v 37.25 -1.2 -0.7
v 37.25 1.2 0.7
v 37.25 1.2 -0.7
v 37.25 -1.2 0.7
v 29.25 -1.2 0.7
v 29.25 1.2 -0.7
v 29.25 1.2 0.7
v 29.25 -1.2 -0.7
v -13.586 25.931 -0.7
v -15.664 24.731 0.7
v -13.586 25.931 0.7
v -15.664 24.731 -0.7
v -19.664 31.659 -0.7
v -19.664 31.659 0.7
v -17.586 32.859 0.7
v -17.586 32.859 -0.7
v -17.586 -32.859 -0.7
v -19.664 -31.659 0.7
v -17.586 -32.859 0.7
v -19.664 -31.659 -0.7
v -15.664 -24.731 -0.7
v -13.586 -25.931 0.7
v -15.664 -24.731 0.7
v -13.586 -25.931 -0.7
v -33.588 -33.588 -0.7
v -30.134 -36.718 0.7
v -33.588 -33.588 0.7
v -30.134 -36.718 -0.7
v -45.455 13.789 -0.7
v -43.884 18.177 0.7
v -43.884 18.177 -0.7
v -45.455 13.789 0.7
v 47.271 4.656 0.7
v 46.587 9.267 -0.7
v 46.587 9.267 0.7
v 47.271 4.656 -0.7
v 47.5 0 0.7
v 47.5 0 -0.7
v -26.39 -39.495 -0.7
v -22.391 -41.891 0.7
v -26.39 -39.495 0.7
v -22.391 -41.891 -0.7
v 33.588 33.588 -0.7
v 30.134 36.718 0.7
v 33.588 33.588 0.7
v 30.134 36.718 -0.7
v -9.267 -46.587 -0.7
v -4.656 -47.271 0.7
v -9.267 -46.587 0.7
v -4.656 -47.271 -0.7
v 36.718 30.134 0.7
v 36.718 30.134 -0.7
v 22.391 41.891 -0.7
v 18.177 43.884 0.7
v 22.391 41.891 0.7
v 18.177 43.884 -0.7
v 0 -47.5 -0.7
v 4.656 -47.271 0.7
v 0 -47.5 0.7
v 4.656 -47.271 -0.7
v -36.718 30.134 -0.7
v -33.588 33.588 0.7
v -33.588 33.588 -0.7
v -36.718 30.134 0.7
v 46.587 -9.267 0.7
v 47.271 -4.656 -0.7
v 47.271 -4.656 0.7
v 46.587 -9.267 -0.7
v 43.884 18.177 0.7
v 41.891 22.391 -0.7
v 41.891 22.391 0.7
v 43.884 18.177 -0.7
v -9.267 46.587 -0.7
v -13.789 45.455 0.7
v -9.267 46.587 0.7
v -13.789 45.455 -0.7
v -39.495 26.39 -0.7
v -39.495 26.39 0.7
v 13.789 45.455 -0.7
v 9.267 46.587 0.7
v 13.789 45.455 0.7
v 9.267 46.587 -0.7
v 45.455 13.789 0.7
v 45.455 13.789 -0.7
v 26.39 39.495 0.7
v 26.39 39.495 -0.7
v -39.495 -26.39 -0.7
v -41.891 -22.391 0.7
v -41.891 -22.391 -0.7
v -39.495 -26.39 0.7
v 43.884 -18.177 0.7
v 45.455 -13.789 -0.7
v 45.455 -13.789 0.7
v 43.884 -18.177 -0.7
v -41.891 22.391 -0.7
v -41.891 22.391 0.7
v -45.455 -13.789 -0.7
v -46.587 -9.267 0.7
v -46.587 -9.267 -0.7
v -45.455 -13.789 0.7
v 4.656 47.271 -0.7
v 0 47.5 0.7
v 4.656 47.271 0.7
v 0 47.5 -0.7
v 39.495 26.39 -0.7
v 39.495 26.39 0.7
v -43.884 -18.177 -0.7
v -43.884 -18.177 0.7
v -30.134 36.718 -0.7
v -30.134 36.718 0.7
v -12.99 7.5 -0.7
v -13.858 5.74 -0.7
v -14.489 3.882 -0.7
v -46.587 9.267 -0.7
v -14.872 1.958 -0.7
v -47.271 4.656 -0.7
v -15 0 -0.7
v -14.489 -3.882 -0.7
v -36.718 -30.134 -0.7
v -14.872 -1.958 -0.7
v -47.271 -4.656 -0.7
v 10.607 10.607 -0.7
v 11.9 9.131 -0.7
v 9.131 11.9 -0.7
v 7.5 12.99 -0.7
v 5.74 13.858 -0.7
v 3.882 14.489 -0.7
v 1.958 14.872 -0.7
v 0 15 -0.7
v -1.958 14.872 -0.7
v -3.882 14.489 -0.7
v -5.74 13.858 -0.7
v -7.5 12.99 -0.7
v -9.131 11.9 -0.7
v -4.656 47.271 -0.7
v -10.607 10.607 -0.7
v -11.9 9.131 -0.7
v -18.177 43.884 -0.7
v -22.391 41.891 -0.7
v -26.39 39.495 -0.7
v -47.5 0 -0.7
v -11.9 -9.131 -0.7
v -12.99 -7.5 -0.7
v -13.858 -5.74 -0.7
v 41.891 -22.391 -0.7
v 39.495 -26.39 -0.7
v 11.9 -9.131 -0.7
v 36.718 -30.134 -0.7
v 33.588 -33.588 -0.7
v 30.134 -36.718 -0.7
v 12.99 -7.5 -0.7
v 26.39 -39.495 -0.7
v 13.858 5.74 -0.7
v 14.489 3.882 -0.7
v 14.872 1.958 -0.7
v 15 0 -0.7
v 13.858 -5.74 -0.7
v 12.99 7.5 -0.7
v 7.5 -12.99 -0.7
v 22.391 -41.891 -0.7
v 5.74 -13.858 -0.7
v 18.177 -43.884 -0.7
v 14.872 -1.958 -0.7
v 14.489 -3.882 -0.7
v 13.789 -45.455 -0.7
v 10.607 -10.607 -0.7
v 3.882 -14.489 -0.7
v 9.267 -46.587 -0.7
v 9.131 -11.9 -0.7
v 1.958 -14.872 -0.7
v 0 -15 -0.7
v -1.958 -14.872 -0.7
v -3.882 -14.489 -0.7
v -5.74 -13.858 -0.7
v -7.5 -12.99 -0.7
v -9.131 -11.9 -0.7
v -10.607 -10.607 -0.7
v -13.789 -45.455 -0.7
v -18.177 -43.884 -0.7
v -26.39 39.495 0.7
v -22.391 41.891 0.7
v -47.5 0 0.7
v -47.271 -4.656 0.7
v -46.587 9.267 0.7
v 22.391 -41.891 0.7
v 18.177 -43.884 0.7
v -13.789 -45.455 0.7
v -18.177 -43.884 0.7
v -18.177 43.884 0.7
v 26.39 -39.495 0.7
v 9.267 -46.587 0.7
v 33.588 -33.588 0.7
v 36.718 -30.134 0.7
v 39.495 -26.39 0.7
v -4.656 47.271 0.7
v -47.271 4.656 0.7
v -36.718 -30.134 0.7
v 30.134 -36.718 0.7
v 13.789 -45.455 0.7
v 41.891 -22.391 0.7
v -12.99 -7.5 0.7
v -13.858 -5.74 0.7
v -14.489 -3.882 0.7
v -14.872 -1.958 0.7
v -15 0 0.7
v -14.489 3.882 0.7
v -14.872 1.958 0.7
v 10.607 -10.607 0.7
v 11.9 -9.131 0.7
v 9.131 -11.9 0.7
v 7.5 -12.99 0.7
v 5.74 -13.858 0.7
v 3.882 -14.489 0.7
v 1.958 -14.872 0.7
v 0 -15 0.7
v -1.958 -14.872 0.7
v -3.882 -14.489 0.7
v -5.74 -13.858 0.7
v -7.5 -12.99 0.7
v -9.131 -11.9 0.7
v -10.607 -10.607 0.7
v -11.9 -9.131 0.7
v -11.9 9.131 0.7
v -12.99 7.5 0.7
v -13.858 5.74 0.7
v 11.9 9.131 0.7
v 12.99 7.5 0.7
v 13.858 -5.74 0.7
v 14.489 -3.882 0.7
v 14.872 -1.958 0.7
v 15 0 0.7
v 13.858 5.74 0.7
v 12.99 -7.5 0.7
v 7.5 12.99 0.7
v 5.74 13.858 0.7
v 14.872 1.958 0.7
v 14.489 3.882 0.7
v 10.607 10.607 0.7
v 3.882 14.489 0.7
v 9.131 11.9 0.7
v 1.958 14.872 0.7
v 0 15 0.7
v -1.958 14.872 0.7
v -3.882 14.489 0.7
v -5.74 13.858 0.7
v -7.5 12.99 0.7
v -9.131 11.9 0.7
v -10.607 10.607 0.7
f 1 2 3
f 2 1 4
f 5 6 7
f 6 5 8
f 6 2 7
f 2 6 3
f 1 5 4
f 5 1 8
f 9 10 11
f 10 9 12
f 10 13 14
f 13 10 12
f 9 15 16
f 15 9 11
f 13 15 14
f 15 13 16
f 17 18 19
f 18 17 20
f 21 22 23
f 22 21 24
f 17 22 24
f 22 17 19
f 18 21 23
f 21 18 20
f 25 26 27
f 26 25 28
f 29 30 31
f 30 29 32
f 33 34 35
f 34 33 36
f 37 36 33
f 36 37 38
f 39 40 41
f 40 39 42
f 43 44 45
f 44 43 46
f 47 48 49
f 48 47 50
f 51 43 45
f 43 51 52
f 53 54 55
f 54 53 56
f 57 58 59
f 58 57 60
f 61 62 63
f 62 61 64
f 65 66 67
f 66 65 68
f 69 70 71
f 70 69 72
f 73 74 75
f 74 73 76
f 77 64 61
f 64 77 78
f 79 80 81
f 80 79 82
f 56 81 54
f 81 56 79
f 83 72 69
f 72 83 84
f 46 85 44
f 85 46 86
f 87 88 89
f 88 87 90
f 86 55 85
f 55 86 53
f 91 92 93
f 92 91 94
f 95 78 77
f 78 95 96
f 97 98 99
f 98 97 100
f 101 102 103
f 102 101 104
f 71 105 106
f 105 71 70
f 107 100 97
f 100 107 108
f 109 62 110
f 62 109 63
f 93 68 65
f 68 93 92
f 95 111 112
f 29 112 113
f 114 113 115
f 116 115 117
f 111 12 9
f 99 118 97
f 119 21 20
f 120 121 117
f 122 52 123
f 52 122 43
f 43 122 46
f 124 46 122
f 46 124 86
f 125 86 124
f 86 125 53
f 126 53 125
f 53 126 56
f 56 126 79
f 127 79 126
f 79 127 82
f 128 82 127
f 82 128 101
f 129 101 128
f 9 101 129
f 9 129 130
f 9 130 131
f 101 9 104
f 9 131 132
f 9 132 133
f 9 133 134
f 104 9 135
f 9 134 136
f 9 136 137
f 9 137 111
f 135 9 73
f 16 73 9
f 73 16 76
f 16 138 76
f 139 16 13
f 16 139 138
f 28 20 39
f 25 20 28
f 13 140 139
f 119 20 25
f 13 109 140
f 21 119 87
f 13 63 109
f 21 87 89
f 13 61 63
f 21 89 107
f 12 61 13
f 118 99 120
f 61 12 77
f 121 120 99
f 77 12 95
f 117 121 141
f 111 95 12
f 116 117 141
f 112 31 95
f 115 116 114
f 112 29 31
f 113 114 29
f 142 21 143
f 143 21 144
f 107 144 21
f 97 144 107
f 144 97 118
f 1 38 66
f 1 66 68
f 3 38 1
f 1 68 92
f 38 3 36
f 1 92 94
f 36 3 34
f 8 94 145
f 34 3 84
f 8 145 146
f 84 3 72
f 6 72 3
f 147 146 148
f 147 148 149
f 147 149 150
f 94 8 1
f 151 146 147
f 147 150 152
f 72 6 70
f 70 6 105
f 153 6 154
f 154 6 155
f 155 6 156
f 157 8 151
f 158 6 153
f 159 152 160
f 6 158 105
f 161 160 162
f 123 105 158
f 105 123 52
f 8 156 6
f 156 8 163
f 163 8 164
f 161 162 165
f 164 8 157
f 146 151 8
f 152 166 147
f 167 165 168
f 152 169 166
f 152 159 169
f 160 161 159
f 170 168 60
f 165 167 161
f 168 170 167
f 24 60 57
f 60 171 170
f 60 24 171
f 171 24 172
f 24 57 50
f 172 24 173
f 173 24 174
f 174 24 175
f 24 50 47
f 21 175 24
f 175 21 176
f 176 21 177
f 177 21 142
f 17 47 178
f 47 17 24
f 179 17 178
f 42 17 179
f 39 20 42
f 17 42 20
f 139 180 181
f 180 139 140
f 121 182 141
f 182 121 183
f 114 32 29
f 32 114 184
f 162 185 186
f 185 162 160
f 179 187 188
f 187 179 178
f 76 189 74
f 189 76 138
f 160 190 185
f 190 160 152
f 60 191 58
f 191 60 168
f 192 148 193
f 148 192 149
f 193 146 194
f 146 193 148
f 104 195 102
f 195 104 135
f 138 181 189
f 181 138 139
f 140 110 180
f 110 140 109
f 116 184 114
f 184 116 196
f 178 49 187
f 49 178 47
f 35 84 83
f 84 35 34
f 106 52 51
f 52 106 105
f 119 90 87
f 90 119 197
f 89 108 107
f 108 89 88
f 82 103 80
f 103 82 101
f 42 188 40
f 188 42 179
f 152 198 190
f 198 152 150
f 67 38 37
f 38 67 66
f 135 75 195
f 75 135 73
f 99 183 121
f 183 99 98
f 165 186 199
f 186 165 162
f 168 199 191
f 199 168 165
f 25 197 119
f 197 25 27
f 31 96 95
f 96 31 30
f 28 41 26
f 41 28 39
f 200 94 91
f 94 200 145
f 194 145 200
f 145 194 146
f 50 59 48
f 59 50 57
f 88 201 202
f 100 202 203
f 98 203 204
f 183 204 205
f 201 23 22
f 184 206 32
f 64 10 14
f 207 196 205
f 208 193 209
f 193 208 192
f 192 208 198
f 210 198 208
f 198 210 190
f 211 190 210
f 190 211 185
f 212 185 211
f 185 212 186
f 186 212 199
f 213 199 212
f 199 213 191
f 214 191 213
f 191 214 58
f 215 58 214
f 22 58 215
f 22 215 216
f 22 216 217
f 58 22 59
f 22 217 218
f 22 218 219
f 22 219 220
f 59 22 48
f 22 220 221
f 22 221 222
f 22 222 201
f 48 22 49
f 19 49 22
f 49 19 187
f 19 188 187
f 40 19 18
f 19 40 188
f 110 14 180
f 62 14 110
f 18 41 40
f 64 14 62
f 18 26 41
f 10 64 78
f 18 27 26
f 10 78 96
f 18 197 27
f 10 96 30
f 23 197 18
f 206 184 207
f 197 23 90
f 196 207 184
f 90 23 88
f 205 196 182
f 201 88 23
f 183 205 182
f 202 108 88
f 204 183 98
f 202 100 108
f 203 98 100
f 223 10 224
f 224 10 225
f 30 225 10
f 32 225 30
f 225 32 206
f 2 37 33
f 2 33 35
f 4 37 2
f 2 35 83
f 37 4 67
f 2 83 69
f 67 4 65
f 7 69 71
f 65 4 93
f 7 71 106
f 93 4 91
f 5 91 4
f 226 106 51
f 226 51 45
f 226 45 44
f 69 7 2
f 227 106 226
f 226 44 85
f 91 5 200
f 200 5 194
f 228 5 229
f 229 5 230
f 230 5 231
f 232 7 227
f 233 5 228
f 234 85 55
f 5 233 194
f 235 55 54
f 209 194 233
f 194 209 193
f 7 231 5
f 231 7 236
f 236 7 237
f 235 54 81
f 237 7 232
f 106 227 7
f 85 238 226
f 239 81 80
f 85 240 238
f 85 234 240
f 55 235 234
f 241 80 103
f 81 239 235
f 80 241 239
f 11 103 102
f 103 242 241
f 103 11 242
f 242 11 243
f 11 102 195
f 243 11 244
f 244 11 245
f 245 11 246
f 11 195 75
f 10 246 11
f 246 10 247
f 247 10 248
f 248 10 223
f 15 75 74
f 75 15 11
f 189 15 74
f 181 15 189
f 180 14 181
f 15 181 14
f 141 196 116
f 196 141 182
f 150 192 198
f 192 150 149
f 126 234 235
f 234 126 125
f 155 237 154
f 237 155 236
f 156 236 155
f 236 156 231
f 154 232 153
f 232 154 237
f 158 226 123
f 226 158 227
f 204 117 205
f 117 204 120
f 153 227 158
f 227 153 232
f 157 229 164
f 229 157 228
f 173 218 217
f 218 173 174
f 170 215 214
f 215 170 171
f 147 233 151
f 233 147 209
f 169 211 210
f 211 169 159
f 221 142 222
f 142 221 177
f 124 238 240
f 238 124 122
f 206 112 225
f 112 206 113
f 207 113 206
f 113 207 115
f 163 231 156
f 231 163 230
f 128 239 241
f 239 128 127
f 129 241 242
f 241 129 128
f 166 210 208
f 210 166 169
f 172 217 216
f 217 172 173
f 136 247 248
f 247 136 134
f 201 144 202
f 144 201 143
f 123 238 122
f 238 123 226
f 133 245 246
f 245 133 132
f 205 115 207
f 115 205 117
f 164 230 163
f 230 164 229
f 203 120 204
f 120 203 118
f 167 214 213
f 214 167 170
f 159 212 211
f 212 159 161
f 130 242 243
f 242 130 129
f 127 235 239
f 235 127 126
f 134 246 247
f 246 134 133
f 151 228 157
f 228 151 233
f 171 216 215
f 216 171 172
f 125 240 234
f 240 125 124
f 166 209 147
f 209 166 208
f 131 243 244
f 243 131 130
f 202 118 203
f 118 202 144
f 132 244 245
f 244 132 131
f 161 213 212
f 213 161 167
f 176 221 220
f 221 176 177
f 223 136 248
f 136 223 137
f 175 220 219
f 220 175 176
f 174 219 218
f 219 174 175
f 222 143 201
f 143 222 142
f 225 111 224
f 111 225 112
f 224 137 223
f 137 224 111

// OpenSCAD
/*
 * SHIPPING_INSERTS.scad
 * Thicker inserts (1.4 mm) to protect the precise 1.0 mm gaps during shipping/transport.
 * Replace with normal 1.0 mm spacers for operation.
 * Print 24-26 of these.
 * From the May 2026 Grok design conversation.
 */

module shipping_insert(thick=1.4) {
    difference() {
        cylinder(d=95, h=thick, center=true, $fn=64);
        cylinder(d=30, h=thick+0.2, center=true, $fn=48);
        
        // Lightening / easy removal tabs
        for (i = [0:2]) {
            rotate([0,0,i*120])
                translate([95*0.35, 0, 0])
                    cube([8, thick+1, 12], center=true);
        }
    }
}

// Example: one insert
shipping_insert(1.4);
